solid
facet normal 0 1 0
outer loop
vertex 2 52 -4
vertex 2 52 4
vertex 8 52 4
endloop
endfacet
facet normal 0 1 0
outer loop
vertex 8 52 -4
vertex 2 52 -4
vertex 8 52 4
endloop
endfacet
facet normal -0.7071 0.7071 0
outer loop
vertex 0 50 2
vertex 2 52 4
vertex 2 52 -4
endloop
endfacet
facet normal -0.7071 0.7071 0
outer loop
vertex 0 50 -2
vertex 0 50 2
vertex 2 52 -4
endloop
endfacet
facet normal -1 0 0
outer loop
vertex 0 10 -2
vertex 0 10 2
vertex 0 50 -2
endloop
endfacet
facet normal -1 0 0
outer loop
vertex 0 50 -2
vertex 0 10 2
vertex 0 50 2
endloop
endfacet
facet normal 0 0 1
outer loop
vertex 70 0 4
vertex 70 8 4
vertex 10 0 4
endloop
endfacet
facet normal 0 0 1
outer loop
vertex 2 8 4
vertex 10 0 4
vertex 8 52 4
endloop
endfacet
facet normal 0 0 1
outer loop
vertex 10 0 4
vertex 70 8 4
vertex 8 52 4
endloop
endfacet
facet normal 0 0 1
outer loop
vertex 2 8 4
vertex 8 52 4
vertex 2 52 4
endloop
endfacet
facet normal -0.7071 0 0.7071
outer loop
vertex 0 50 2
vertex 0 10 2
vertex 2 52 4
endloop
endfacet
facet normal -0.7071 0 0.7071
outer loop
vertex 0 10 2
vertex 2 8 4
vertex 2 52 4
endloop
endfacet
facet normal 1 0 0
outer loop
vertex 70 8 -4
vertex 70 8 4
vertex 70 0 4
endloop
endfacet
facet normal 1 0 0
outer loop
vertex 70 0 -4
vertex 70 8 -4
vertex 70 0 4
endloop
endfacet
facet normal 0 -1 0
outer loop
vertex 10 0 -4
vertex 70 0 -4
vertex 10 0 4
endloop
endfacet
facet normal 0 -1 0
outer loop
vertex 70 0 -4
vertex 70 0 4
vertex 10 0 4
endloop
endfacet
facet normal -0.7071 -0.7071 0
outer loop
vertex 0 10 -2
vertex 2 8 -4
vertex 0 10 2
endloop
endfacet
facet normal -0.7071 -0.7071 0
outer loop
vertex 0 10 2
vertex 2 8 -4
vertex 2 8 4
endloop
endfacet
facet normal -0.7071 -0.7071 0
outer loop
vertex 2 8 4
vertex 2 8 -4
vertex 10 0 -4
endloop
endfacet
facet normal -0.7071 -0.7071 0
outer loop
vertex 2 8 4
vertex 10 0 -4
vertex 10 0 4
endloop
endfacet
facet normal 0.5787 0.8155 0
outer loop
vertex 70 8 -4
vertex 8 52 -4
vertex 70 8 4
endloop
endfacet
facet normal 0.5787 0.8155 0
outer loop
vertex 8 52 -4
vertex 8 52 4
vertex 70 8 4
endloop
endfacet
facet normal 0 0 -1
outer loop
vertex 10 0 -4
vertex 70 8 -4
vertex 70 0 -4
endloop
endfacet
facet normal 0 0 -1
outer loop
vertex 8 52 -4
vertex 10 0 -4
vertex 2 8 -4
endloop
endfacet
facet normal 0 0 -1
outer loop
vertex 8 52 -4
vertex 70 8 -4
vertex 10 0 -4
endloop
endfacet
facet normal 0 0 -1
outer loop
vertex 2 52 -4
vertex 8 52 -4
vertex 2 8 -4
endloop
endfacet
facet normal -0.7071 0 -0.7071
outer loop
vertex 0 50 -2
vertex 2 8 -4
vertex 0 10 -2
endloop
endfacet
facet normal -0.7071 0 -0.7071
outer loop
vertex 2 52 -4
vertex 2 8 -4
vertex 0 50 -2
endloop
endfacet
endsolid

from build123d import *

# Parameters (mm, degrees)
EXTRUDE_1_DEPTH = 4
CHAMFER_1_SIZE  = 10
CHAMFER_2_SIZE  = 2
CHAMFER_3_SIZE  = 2


with BuildPart() as part:
    # Эскиз1 → Бобышка-Вытянуть1 (new, symmetric)
    with BuildSketch(Plane.XY):
        Polygon((0, 0), (0, 52), (8, 52), (70, 8), (70, 0), align=None)
    extrude(amount=EXTRUDE_1_DEPTH, both=True)

    # Фаска1
    chamfer_1_edges = [part.edges().sort_by_distance(p)[0] for p in [
        (0, 0, 0),
    ]]
    chamfer(chamfer_1_edges, length=CHAMFER_1_SIZE)

    # Фаска2
    chamfer_2_edges = [part.edges().sort_by_distance(p)[0] for p in [
        (0, 31, 4),
        (0, 31, -4),
    ]]
    chamfer(chamfer_2_edges, length=CHAMFER_2_SIZE)

    # Фаска3
    chamfer_3_edges = [part.edges().sort_by_distance(p)[0] for p in [
        (0, 52, 0),
    ]]
    chamfer(chamfer_3_edges, length=CHAMFER_3_SIZE)


solid = part.part
